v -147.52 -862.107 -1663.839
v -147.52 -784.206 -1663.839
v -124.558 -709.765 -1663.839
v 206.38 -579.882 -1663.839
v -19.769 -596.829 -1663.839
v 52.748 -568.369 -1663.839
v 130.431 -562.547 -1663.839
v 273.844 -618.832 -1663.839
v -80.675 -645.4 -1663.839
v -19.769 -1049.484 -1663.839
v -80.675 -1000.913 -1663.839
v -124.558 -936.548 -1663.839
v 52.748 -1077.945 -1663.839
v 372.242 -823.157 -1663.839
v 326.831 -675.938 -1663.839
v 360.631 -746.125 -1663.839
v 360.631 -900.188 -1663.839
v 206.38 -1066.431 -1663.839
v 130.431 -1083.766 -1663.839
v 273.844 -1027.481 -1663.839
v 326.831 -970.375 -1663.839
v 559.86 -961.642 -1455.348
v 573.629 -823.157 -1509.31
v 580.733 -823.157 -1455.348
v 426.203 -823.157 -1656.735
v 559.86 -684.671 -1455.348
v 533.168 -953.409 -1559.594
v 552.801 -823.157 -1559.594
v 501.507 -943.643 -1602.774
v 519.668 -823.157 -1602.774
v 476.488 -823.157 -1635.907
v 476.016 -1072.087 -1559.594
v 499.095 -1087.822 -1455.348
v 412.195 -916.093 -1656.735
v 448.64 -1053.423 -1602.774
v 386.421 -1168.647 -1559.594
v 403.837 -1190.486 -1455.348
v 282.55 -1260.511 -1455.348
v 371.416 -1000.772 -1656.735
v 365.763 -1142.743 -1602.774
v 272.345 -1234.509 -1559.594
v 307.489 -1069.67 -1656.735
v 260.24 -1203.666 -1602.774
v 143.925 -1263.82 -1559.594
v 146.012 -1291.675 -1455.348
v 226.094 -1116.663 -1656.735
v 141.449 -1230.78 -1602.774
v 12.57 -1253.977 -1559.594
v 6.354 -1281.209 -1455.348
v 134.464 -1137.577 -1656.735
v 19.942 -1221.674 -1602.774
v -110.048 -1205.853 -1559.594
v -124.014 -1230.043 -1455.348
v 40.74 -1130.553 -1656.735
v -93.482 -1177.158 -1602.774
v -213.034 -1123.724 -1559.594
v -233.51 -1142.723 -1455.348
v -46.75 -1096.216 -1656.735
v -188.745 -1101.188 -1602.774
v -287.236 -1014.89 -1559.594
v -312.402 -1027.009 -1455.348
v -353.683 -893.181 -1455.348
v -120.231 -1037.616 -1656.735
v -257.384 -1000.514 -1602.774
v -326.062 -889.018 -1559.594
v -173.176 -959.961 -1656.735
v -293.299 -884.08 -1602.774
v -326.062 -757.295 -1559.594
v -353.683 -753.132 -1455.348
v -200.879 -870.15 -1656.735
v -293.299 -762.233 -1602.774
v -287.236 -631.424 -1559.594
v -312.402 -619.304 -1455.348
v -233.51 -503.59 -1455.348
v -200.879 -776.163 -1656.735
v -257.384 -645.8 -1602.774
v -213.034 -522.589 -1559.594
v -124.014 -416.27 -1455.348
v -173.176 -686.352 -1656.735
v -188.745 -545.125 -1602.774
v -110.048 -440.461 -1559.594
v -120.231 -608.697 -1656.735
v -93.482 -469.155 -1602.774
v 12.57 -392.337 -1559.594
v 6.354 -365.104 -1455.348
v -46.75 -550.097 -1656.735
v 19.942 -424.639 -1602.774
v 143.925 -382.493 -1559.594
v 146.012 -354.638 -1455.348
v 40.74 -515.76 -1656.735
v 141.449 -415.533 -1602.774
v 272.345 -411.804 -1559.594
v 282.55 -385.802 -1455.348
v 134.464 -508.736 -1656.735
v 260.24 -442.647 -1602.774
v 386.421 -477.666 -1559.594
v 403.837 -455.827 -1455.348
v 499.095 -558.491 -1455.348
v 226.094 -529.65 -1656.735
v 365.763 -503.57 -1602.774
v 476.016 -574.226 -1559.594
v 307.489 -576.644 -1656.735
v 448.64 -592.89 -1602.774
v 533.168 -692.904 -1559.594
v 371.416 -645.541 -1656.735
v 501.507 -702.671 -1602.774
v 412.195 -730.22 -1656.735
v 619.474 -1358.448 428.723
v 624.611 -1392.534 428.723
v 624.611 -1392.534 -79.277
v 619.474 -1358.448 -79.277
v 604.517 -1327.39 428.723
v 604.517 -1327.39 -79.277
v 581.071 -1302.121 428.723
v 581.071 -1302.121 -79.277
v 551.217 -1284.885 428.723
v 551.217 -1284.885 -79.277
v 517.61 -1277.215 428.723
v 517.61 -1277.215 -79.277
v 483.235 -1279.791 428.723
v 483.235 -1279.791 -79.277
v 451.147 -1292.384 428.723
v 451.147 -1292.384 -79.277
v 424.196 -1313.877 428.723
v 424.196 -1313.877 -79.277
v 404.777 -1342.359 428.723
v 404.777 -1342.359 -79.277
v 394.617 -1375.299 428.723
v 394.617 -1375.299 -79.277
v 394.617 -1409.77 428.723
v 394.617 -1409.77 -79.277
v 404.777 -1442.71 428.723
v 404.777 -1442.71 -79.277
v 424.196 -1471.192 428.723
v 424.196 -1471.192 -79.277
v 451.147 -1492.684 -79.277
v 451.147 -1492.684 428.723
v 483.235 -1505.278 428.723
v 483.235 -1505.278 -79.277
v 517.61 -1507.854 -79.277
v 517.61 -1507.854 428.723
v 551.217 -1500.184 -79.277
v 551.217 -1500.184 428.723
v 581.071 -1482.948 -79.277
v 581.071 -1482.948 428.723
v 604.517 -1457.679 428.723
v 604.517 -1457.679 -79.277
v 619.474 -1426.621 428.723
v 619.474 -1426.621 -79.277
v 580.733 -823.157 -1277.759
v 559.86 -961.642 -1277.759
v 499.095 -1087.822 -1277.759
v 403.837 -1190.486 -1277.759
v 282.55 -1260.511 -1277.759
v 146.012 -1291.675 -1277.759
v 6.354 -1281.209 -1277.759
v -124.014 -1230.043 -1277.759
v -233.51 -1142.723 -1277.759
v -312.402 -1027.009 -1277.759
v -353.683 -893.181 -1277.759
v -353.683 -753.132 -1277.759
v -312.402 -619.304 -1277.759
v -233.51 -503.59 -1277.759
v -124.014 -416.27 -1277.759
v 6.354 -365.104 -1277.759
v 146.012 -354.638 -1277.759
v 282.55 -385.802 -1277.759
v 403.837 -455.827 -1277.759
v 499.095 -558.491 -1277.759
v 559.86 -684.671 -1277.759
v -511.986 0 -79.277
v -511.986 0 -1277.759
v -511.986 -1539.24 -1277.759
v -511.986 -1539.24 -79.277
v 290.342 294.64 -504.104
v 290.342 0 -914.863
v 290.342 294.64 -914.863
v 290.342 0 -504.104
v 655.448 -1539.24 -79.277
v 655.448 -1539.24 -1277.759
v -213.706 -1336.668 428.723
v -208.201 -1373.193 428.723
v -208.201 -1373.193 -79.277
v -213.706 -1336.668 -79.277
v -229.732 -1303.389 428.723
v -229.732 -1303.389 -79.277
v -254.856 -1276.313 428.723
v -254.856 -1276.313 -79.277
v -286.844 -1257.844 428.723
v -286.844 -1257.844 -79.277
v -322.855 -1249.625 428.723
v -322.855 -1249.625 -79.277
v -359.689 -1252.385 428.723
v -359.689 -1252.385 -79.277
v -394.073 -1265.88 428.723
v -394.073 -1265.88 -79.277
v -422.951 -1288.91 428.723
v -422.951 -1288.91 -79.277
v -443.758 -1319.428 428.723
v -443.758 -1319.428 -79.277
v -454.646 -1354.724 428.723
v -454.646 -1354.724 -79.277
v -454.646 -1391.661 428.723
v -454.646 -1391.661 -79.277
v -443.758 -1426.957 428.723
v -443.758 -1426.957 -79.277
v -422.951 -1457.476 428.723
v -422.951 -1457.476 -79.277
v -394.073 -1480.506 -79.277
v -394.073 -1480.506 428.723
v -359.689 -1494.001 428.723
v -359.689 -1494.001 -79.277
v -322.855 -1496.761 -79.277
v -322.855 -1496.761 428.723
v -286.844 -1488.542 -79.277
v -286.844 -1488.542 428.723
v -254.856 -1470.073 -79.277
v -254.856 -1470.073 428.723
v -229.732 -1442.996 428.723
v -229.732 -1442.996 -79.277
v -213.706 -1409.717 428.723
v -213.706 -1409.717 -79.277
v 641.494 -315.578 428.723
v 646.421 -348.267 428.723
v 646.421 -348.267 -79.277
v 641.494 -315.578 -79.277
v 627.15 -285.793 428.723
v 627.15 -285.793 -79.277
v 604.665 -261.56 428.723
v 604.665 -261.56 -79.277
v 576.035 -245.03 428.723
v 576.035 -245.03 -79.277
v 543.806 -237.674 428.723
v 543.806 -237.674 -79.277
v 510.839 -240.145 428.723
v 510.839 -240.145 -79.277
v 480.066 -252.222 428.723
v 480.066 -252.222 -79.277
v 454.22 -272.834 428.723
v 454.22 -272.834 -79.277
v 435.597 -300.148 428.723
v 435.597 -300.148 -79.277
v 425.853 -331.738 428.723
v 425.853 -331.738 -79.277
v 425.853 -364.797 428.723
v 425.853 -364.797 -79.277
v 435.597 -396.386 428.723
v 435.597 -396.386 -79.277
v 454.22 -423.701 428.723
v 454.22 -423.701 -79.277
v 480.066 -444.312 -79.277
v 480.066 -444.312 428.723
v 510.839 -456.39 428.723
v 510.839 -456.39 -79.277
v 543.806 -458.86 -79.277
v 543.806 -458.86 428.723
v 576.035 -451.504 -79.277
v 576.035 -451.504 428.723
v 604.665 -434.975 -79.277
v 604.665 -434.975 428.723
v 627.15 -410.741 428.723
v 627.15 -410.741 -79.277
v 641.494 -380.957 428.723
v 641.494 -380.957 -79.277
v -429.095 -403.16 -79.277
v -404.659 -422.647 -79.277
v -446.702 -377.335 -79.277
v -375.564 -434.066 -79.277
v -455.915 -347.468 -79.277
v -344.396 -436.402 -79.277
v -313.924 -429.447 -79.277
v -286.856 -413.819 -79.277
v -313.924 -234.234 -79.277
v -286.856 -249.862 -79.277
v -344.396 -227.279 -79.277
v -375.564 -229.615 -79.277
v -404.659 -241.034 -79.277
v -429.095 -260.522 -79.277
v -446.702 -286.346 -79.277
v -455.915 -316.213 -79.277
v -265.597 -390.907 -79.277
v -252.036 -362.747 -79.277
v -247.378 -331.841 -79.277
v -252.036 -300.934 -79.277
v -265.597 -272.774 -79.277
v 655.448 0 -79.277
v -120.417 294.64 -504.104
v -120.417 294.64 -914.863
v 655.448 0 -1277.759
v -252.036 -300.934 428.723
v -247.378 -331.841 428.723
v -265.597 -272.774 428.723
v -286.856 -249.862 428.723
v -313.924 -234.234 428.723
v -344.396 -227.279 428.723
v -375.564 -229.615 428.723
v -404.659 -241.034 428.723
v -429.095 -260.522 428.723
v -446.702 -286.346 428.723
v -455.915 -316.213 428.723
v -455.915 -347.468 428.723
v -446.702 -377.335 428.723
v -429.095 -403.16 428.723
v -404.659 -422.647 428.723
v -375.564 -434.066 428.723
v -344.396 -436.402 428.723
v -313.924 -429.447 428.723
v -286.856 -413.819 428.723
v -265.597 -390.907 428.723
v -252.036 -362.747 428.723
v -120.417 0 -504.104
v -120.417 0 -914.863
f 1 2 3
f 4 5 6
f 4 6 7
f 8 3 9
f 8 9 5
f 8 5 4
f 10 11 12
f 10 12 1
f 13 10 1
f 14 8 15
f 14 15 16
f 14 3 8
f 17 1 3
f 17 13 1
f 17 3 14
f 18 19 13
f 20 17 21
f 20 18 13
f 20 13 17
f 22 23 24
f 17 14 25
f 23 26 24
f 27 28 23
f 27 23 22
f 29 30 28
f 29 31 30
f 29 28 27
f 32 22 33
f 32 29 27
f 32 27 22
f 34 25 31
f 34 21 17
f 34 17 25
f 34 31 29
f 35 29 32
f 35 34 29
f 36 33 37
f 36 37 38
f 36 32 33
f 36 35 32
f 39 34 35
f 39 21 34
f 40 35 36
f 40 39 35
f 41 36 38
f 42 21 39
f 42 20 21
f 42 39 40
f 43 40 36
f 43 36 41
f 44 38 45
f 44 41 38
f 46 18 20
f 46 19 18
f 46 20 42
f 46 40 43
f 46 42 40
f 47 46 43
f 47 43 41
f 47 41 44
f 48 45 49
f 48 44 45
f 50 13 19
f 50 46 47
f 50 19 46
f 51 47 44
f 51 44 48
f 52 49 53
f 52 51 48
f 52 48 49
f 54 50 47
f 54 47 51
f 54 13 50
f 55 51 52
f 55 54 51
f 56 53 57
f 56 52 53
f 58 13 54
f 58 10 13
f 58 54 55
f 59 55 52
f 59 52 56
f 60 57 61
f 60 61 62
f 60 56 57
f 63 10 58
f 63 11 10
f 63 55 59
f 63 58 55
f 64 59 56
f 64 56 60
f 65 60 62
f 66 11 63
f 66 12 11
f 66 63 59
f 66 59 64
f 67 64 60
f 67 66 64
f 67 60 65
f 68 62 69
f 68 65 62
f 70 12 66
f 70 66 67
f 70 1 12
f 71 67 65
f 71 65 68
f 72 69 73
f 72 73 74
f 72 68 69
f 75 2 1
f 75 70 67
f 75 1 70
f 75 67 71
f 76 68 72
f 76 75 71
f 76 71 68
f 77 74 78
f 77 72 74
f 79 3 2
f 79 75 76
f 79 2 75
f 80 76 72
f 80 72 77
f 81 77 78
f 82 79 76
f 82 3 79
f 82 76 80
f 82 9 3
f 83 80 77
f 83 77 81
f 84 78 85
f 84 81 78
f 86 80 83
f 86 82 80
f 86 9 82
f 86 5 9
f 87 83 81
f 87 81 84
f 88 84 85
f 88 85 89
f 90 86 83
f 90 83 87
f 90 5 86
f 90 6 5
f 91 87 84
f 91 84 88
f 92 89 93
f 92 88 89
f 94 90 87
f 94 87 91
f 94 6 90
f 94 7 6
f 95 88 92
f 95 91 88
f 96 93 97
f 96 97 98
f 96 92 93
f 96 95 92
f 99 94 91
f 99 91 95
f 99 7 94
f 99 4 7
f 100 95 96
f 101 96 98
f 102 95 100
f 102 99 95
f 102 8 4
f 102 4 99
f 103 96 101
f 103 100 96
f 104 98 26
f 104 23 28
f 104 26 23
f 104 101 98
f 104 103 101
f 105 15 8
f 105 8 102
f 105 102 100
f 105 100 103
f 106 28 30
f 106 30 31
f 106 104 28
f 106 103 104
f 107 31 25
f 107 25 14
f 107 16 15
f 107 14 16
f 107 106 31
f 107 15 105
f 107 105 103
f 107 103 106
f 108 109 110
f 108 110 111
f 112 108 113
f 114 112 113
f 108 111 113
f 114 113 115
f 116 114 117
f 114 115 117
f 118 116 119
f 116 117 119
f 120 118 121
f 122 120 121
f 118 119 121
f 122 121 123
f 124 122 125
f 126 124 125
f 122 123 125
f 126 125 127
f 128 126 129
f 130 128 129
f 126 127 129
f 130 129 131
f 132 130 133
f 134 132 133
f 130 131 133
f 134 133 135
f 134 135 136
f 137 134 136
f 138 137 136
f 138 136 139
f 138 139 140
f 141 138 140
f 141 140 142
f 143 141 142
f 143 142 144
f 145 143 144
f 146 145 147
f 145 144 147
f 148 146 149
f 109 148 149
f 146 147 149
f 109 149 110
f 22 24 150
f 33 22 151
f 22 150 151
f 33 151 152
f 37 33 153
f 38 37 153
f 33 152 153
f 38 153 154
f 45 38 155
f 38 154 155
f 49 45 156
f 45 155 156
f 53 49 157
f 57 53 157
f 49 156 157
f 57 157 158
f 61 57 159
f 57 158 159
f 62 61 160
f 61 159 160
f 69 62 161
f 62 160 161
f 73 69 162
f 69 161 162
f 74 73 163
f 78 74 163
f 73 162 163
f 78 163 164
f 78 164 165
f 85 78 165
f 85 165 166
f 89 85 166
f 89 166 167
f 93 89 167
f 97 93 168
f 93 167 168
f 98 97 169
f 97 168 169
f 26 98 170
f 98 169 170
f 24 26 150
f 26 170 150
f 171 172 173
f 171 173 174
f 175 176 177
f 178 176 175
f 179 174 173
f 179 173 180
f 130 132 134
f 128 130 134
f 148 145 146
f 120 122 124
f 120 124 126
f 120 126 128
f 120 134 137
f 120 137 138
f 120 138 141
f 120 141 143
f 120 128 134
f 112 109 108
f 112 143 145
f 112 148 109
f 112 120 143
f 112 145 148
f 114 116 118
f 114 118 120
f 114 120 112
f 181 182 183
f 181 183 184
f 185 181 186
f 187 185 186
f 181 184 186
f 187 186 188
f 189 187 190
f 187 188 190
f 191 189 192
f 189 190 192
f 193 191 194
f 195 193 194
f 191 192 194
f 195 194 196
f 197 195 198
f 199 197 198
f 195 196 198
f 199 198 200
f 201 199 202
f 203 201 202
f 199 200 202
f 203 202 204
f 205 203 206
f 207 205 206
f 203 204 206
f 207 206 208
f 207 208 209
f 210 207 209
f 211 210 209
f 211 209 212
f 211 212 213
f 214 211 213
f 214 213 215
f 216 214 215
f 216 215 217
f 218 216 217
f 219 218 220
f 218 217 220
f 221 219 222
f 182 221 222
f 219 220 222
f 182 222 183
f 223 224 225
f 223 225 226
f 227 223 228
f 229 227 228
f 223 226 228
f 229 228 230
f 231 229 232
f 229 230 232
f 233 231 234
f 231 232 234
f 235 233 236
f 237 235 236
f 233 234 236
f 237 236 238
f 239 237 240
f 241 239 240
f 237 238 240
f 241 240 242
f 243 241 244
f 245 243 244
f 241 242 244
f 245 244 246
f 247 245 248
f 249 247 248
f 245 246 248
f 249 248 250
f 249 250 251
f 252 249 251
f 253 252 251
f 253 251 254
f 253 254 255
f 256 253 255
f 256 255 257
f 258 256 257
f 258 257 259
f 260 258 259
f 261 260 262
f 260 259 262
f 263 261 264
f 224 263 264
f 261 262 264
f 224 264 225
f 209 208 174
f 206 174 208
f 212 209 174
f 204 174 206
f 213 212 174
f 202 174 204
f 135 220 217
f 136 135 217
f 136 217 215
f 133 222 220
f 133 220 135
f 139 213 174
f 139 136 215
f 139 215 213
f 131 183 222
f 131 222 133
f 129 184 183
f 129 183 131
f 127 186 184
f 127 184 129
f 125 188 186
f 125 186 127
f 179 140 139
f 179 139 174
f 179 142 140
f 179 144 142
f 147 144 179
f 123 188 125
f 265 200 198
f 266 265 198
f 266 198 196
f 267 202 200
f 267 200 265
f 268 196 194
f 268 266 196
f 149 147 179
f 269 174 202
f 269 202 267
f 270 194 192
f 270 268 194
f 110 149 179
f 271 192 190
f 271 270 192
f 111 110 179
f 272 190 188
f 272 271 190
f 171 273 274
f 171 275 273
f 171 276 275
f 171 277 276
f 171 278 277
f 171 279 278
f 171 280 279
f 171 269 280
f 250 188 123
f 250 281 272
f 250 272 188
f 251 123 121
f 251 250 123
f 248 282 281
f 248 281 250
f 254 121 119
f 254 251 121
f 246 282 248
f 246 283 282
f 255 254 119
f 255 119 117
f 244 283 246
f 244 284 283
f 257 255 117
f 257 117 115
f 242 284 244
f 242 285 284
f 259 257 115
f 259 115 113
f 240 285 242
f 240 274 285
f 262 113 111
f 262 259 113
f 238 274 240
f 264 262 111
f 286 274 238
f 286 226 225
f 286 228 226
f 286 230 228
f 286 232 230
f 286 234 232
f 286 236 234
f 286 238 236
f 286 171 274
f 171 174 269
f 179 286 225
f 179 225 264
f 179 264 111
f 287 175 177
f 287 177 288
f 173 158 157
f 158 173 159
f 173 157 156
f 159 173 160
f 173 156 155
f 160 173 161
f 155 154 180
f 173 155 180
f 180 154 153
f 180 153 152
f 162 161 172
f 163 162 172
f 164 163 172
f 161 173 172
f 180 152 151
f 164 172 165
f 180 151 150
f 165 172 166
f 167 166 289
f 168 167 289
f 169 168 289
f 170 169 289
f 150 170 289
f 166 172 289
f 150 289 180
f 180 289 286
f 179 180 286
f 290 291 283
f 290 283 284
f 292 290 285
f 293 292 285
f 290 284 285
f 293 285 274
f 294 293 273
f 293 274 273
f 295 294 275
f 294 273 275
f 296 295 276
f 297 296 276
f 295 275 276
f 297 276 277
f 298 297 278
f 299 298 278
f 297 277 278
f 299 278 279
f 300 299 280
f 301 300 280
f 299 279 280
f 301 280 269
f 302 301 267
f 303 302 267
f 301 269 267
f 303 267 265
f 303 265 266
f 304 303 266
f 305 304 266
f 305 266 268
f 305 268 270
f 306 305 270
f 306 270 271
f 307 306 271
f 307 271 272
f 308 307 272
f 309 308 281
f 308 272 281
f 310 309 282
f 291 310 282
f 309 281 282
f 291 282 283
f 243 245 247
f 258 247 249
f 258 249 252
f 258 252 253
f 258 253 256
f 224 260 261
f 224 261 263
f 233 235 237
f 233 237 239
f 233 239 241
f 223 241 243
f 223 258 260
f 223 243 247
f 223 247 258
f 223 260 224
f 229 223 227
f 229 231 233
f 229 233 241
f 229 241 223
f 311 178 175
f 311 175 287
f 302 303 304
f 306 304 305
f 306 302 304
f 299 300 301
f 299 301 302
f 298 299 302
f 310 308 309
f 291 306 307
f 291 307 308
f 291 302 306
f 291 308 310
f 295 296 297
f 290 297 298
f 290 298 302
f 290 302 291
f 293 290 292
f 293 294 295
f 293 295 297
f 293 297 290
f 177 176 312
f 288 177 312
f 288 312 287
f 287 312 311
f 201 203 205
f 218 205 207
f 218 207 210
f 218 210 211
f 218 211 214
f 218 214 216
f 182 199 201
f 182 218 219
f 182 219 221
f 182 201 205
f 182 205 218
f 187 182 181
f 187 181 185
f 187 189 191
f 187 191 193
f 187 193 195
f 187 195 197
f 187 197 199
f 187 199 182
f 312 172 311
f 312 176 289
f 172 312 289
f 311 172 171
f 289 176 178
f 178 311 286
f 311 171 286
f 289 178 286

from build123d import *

# Parameters (mm, degrees)
F0_W     = 1167.4337387085
F0_H     = 1198.4824165702
F1_DEPTH = 1539.24
F3_R     = 123.9144502876
F3_R_2   = 110.9033314698
F3_R_3   = 115.6432590045
F2_R     = 104.8542871517
F4_DEPTH = 508
F5_W     = 410.7590019703
F5_H     = 410.758972168
F6_DEPTH = 294.64
F7_R     = 469.8318495328
F8_DEPTH = 386.08
F9_R     = 208.4914832465


with BuildPart() as f1:
    # F0 (on Front) → F1 (new body)
    with BuildSketch(Plane.XZ):
        with Locations((71.7308521271, -678.5182245076)):
            Rectangle(F0_W, F0_H)
    extrude(amount=F1_DEPTH)

    # F3 (on face) + F2 (on face) → F4 (join)
    with BuildSketch(Plane.XY.offset(-79.2770162225)):
        with Locations((-332.1154117584, -1373.1929063797)):
            Circle(F3_R)
        with Locations((535.5177521706, -348.2672572136)):
            Circle(F3_R_2)
        with Locations((508.9682340622, -1392.5344944)):
            Circle(F3_R_3)
    with BuildSketch(Plane.XY.offset(-79.2770162225)):
        with Locations((-352.2318005562, -331.8405747414)):
            Circle(F2_R)
    extrude(amount=F4_DEPTH)

    # F5 (on face) → F6 (join)
    with BuildSketch(Plane(origin=(0, 0, 0), x_dir=(-1, 0, 0), z_dir=(0, 1, 0))):
        with Locations((-84.9629417062, -709.4834446907)):
            Rectangle(F5_W, F5_H)
    extrude(amount=F6_DEPTH)

    # F7 (on face) → F8 (join)
    with BuildSketch(Plane(origin=(0, 0, -1277.7594327927), x_dir=(1, 0, 0), z_dir=(0, 0, -1))):
        with Locations((110.9014376998, 823.1565952301)):
            Circle(F7_R)
    extrude(amount=F8_DEPTH)

    # F9
    f9_edges = [f1.edges().sort_by_distance(p)[0] for p in [
        (-358.930412, -823.156595, -1663.839433),
    ]]
    fillet(f9_edges, radius=F9_R)


solid = f1.part
